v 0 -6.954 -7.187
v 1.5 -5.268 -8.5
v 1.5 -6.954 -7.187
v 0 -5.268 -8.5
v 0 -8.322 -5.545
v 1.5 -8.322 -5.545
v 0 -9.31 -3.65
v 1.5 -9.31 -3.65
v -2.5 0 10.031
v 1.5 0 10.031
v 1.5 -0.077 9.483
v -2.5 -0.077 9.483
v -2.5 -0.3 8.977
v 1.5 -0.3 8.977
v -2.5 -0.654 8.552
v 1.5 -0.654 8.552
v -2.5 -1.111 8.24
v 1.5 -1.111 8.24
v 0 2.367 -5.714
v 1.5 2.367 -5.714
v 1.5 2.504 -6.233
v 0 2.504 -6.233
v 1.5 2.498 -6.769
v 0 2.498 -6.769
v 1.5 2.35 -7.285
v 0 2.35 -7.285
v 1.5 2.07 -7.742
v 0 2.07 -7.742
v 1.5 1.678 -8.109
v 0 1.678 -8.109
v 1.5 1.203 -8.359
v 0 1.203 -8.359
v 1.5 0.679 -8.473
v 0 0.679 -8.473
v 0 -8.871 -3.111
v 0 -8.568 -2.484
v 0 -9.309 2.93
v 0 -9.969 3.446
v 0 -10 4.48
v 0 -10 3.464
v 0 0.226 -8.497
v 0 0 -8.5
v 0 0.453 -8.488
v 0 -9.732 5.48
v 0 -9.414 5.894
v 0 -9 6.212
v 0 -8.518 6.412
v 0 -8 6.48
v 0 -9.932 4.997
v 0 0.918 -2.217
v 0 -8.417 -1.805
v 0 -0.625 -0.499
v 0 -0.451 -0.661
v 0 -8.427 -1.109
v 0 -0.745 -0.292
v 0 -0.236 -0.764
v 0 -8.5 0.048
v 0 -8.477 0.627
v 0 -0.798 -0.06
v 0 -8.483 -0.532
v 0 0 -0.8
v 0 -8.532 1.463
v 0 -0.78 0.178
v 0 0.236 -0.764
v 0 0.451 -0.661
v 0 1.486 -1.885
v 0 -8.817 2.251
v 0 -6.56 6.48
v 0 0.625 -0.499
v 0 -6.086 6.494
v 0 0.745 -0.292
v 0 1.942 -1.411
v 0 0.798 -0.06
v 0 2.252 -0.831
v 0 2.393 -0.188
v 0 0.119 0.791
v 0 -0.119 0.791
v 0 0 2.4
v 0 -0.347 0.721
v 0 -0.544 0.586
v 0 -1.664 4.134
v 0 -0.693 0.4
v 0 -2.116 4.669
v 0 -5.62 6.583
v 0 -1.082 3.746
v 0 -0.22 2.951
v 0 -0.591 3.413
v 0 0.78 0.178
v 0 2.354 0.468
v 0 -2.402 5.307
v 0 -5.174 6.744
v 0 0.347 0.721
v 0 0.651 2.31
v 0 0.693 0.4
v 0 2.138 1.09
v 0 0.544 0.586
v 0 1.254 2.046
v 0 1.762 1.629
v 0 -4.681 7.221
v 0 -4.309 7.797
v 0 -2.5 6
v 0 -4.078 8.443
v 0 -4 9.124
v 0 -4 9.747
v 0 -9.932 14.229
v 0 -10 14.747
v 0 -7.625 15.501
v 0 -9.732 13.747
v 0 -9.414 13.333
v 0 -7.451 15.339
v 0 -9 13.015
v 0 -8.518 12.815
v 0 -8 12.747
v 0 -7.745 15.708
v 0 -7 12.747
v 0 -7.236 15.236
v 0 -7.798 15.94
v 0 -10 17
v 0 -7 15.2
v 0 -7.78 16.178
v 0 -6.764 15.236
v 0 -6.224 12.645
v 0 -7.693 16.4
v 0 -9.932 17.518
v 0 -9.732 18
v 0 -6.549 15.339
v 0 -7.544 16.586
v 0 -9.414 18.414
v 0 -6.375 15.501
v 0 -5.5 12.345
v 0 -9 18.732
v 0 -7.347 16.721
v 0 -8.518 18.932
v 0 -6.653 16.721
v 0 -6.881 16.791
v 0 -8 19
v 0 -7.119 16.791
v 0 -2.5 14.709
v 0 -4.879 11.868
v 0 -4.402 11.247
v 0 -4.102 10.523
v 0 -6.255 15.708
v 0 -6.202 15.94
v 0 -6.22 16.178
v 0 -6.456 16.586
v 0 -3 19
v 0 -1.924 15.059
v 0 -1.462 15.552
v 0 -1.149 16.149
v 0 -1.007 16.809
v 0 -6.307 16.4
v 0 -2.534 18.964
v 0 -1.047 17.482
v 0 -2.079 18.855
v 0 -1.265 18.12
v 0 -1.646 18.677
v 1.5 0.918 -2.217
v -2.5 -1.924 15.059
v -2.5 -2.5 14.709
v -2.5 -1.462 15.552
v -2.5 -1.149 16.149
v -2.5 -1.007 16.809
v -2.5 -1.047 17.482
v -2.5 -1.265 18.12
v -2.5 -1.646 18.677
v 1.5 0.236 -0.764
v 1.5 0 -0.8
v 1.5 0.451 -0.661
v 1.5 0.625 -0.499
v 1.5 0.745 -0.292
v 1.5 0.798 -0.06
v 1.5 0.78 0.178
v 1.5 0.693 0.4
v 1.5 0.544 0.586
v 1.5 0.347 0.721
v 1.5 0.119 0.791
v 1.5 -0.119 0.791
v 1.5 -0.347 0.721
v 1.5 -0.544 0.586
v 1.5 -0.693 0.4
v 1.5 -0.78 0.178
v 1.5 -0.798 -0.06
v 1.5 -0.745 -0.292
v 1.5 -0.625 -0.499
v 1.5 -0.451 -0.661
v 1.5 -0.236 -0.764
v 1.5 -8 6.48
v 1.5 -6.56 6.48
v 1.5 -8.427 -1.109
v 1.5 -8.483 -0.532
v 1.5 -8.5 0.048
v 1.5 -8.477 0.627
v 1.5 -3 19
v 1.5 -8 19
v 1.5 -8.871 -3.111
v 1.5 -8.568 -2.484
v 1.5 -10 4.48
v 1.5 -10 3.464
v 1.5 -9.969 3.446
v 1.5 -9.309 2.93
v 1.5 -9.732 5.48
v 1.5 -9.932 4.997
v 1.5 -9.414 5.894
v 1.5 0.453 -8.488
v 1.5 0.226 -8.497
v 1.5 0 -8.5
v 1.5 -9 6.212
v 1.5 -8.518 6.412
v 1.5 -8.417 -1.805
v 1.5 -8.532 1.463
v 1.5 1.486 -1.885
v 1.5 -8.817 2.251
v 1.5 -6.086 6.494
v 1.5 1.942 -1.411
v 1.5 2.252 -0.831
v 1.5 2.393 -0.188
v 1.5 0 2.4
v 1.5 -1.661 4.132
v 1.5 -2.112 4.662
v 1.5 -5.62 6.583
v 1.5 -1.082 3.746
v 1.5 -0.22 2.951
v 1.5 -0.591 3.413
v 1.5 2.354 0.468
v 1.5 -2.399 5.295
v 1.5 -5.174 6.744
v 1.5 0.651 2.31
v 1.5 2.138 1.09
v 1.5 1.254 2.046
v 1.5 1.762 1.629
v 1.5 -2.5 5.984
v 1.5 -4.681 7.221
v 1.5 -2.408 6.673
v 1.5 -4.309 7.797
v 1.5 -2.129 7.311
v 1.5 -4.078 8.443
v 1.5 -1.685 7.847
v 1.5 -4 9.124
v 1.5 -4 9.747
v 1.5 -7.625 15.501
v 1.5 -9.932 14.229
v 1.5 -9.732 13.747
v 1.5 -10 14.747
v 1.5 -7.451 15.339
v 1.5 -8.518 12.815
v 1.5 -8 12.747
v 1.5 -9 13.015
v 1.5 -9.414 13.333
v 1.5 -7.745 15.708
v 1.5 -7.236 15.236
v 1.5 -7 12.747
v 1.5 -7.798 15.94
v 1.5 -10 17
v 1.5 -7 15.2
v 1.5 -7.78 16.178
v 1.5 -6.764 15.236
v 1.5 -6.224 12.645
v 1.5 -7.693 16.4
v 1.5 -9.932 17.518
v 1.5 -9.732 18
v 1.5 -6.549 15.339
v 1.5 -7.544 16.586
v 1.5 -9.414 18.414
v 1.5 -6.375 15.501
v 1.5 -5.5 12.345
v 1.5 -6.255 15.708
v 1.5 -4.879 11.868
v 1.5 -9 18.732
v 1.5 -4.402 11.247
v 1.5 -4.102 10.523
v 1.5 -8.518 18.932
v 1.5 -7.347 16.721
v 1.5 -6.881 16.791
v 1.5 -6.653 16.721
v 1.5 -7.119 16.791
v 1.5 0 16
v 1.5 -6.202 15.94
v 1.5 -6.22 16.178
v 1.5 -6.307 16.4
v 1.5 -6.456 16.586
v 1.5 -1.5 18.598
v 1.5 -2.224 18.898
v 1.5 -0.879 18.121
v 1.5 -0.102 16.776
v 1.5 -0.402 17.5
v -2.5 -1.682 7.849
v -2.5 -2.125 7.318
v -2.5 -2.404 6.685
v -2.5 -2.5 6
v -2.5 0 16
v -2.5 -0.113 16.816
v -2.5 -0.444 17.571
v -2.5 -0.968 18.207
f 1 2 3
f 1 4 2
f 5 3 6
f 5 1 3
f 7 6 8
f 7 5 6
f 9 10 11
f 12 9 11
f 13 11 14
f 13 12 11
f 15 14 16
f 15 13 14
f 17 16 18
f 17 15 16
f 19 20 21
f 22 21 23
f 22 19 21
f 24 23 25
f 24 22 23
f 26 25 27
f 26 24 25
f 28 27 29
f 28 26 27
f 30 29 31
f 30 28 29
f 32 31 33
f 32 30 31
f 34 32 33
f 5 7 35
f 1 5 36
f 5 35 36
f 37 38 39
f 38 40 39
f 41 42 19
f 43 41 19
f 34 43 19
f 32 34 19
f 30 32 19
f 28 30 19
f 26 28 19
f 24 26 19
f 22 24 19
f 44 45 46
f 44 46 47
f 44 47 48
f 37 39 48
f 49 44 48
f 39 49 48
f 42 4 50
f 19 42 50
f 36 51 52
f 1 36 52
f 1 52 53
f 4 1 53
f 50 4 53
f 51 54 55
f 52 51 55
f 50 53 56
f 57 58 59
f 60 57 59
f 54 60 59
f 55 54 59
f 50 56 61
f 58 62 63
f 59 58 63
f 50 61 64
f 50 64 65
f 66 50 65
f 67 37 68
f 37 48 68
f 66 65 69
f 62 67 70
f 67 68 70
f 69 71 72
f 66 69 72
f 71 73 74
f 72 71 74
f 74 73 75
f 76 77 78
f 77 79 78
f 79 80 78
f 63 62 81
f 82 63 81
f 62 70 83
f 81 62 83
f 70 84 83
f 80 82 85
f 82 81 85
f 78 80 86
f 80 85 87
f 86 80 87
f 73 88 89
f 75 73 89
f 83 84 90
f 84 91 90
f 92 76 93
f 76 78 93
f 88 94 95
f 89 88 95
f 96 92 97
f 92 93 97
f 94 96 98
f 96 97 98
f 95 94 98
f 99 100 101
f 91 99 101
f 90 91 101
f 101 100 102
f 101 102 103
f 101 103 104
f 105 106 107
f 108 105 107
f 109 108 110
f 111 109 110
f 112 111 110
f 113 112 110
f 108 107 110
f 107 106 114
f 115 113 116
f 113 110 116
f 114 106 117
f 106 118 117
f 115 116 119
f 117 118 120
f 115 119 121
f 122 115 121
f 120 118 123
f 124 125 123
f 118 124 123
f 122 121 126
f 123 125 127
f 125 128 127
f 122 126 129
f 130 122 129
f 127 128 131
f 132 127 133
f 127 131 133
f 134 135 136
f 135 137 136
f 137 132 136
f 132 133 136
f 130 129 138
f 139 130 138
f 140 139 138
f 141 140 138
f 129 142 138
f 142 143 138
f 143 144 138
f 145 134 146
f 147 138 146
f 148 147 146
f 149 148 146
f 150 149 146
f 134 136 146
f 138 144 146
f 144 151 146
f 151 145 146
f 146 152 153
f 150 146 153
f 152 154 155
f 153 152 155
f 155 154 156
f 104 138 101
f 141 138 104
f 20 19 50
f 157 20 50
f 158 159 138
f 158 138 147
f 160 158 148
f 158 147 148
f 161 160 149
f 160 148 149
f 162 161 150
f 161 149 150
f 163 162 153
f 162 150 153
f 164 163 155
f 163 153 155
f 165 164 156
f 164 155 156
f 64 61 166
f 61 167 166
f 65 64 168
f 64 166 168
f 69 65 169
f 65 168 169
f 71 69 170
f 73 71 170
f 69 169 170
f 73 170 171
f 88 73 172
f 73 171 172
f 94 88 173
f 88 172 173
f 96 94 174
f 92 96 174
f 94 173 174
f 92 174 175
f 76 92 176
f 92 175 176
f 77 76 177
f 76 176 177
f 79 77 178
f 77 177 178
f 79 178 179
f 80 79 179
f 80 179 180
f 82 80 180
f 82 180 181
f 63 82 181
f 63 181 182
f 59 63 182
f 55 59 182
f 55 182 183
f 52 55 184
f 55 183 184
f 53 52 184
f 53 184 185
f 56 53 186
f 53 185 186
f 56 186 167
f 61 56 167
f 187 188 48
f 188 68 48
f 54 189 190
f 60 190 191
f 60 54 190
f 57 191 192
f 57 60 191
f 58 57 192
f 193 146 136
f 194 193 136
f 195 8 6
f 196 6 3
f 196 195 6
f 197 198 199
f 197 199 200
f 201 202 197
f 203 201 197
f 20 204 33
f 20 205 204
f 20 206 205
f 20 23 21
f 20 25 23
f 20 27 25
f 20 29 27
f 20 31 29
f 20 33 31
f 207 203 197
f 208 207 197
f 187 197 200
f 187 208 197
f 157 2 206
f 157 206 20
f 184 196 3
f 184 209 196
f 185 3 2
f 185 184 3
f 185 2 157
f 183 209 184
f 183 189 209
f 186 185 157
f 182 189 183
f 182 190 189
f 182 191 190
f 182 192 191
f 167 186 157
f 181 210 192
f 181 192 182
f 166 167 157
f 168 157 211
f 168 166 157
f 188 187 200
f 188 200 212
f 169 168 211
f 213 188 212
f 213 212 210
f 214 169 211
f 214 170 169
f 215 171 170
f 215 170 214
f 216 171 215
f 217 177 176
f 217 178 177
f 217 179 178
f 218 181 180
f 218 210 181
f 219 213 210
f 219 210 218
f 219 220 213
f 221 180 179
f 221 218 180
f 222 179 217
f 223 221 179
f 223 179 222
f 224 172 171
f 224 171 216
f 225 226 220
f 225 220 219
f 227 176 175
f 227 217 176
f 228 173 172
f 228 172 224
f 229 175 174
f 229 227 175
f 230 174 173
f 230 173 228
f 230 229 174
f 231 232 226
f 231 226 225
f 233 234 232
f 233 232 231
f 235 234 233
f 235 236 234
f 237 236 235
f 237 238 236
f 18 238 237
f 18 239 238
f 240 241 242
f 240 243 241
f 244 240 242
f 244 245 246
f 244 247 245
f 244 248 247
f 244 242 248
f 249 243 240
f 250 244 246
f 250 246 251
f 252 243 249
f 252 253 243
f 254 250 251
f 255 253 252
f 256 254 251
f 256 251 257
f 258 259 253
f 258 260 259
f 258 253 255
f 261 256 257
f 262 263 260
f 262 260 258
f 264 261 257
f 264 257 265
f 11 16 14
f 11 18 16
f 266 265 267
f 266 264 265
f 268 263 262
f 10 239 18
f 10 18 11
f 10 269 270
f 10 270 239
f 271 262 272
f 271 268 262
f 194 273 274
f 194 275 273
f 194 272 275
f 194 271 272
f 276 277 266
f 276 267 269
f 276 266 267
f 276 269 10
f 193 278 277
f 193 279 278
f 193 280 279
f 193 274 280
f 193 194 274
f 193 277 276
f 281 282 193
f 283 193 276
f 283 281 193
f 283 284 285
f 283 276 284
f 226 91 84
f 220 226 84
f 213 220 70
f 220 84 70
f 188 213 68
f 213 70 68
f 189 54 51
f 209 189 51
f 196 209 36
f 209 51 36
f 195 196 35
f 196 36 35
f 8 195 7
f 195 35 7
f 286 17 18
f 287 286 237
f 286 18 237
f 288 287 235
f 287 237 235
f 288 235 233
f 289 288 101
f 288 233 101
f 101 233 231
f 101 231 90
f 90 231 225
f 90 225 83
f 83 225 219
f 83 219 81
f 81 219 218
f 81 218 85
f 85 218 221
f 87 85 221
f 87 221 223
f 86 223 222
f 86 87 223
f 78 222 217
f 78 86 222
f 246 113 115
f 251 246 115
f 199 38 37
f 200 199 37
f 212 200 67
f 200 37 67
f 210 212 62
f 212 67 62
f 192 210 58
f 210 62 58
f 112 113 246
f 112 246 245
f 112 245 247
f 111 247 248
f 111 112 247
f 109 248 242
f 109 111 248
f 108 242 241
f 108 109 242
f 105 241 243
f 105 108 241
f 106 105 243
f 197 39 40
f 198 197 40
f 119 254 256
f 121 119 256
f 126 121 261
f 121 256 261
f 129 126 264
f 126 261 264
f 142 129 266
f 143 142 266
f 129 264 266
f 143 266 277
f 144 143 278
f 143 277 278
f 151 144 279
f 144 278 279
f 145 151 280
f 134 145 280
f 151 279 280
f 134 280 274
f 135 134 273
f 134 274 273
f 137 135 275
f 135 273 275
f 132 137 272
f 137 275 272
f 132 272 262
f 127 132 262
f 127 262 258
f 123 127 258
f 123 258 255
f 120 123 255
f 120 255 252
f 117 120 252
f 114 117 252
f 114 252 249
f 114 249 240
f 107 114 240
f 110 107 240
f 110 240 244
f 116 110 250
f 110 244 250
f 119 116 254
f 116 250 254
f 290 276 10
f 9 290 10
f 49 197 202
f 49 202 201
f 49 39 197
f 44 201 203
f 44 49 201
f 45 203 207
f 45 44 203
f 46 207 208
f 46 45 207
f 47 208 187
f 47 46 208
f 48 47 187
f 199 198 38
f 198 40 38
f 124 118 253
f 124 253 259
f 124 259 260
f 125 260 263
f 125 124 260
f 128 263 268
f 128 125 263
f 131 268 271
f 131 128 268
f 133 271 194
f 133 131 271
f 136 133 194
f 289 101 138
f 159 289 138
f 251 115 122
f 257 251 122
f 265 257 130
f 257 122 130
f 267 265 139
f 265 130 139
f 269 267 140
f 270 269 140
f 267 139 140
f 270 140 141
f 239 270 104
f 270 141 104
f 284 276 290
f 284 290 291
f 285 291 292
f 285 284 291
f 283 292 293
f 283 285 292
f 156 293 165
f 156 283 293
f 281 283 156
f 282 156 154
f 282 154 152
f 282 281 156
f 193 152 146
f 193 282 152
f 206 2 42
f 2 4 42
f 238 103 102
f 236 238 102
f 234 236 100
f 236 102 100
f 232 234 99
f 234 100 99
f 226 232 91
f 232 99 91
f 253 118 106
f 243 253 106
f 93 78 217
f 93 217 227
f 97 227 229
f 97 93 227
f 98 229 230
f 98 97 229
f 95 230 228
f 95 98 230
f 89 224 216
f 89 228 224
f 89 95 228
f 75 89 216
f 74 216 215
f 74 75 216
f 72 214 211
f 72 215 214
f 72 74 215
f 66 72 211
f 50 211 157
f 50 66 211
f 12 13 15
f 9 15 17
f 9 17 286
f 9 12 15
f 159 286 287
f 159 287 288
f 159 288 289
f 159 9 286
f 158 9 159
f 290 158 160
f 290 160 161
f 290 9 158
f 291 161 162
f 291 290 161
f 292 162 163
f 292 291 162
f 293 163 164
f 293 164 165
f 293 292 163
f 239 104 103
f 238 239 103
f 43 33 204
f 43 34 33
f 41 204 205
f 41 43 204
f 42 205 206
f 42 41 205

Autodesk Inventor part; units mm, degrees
ref_plane "YZ Plane" through (0, 0, 0) normal (1, 0, 0) x (0, 1, 0)
ref_plane "XZ Plane" through (0, 0, 0) normal (0, 1, 0) x (-1, 0, 0)
ref_plane "XY Plane" through (0, 0, 0) normal (0, 0, 1) x (1, 0, 0)
sketch "スケッチ1" plane through (0, 0, 0) normal (1, 0, 0) x (0, 1, 0)
  circle A0 centre (0, 0) radius 6 construction
  circle A1 centre (6, 0) radius 0.8
  line L0 (-14, 0) -> (14, 0)
  circle A2 centre (4.242641, 4.242641) radius 0.8
  circle A3 centre (0, 6) radius 0.8
  circle A4 centre (-4.242641, 4.242641) radius 0.8
  circle A5 centre (-6, 0) radius 0.8
  circle A6 centre (-4.242641, -4.242641) radius 0.8
  circle A7 centre (0, -6) radius 0.8
  circle A8 centre (4.242641, -4.242641) radius 0.8
  circle A9 centre (0, 0) radius 2.4
  line L1 (0, 0) -> (0, 6)
  line L2 (0, 0) -> (2.296101, -5.543277)
  circle A10 centre (0, 0) radius 10
  line L3 (2.296101, -5.543277) -> (3.826834, -9.238795)
  line L4 (0, -9.238795) -> (-10, -9.238795)
  line L5 (-10, -9.238795) -> (-10, 20)
  line L6 (-10, 20) -> (0, 20)
  line L7 (0, 20) -> (0, -9.238795)
  line L8 (0, -6) -> (4.242641, -4.242641) construction
  line L9 (0, -9.238795) -> (3.826834, -9.238795)
  circle A11 centre (0, 6) radius 2.5
  point P0 (0, 5.2)
  point P1 (0, 6.8)
  point P2 (-10, 0)
  point P3 (2.12132, -5.12132)
  point P4 (0, 2.4)
  point P5 (0.91844, -2.217311)
  point P6 (0, 8.5)
  point P7 (0, 10)
  point P8 (0, 3.5)
  point P9 (-3.826834, -9.238795)
  point P10 (0, -6.8)
  point P11 (0, -5.2)
  point P12 (0, -2.4)
  dimension "d1" = 12
  dimension "d2" = 1.6
  dimension "d5" = 360
  dimension "d7" = 4.8
  dimension "d8" = 4
  dimension "d21" = 5
  dimension "d23" = 20
sketch "スケッチ1 outline for 押し出し1" plane through (0, 0, 0) normal (1, 0, 0) x (0, 1, 0)
  arc A0 (0.91844, -2.217311) -> (0, 2.4) centre (0, 0) ccw
  line L0 (0, 2.4) -> (0, 3.5)
  arc A1 (0, 3.5) -> (0, 8.5) centre (0, 6) cw
  line L1 (0, 8.5) -> (0, 20)
  line L2 (0, 20) -> (-10, 20)
  line L3 (-10, 20) -> (-10, -9.238795)
  line L4 (-10, -9.238795) -> (3.826834, -9.238795)
  line L5 (3.826834, -9.238795) -> (0.91844, -2.217311)
extrude "押し出し1" add sketch "スケッチ1 outline for 押し出し1" along normal blind 1.5
sketch "スケッチ6" plane through (0, 0, 0) normal (-1, 0, 0) x (0, 0, 1)
  line L0 (12.746794, -7) -> (12.746794, -8)
  line L1 (17, -10) -> (14.746794, -10)
  line L2 (19, -8) -> (19, -3)
  arc A0 (19, -3) -> (16, 0) centre (16, -3) ccw
  line L3 (10.031129, 0) -> (16, 0)
  arc A1 (3.630208, 0.796296) -> (8.239516, -1.111111) centre (6, 0) ccw
  arc A2 (3.276042, 2.707407) -> (-3.926488, 1.626405) centre (0, 0) ccw
  line L4 (-5.713879, 2.366766) -> (-3.926488, 1.626405)
  arc A3 (-8.47286, 0.678702) -> (-8.5, 0) centre (0, 0) ccw
  line L5 (-8.5, 0) -> (-8.5, -5.267827)
  arc A4 (-8.5, -5.267827) -> (-3.6504, -9.309918) centre (0, 0) ccw
  arc A5 (-1.108696, -8.427384) -> (-3.6504, -9.309918) centre (-1.5, -11.401754) ccw
  arc A6 (-1.108696, -8.427384) -> (0.626747, -8.476862) centre (0, 0) ccw
  arc A7 (3.446028, -9.968696) -> (0.626747, -8.476862) centre (0.847952, -11.468696) ccw
  line L6 (3.446028, -9.968696) -> (3.464102, -10)
  line L7 (4.479657, -10) -> (3.464102, -10)
  line L8 (6.479657, -8) -> (6.479657, -6.559689)
  arc A8 (6.743932, -5.173913) -> (6.479657, -6.559689) centre (9.47607, -6.413035) ccw
  arc A9 (9.124144, -4) -> (6.743932, -5.173913) centre (9.124144, -7) ccw
  line L9 (9.124144, -4) -> (9.746794, -4)
  arc A10 (12.746794, -7) -> (9.746794, -4) centre (9.746794, -7) ccw
  circle A11 centre (17, -3.5) radius 0.8
  circle A12 centre (-6, 0) radius 0.8
  circle A13 centre (-4.242641, -4.242641) radius 0.8
  circle A14 centre (4.242641, -4.242641) radius 0.8
  circle A15 centre (0, -6) radius 0.8
  arc A16 (2.4, 0) -> (-2.217311, 0.91844) centre (0, 0) ccw
  line L10 (-9.238795, 3.826834) -> (-2.217311, 0.91844)
  line L11 (-9.238795, -10) -> (-9.238795, 3.826834)
  line L12 (20, -10) -> (-9.238795, -10)
  line L13 (20, 0) -> (20, -10)
  line L14 (8.5, 0) -> (20, 0)
  arc A17 (3.5, 0) -> (8.5, 0) centre (6, 0) ccw
  line L15 (2.4, 0) -> (3.5, 0)
  circle A18 centre (16, -7) radius 0.8
  circle A19 centre (0, 0) radius 0.8
  arc A20 (3.630208, 0.796296) -> (3.276042, 2.707407) centre (1.734375, 1.433333) ccw
  arc A21 (-5.713879, 2.366766) -> (-8.47286, 0.678702) centre (-6.479246, 0.519007) ccw
  arc A22 (4.479657, -10) -> (6.479657, -8) centre (4.479657, -8) ccw
  arc A23 (12.746794, -8) -> (14.746794, -10) centre (14.746794, -8) ccw
  arc A24 (17, -10) -> (19, -8) centre (17, -8) ccw
  arc A25 (10.031129, 0) -> (8.239516, -1.111111) centre (10.031129, -2) ccw
  point P0 (-7.852976, 3.252809)
  point P1 (6.479657, -10)
  point P2 (12.746794, -10)
  point P3 (16, 0)
  point P4 (19, -10)
  point P5 (-3.926488, 1.626405)
  point P6 (8.239516, -1.111111)
  point P7 (-3.926488, 1.626405)
  point P8 (16, 0)
sketch "スケッチ6 outline for 押し出し5" plane through (0, 0, 0) normal (-1, 0, 0) x (0, 0, 1)
  arc A0 (8.5, 0) -> (8.239516, -1.111111) centre (6, 0) cw
  line L0 (10.031129, 0) -> (8.5, 0)
  arc A1 (8.239516, -1.111111) -> (10.031129, 0) centre (10.031129, -2) cw
  line L1 (12.746794, -8) -> (12.746794, -7)
  arc A2 (14.746794, -10) -> (12.746794, -8) centre (14.746794, -8) cw
  line L2 (4.479657, -10) -> (14.746794, -10)
  arc A3 (6.479657, -8) -> (4.479657, -10) centre (4.479657, -8) cw
  line L3 (6.479657, -6.559689) -> (6.479657, -8)
  arc A4 (6.743932, -5.173913) -> (6.479657, -6.559689) centre (9.47607, -6.413035) ccw
  arc A5 (9.124144, -4) -> (6.743932, -5.173913) centre (9.124144, -7) ccw
  line L4 (9.746794, -4) -> (9.124144, -4)
  arc A6 (12.746794, -7) -> (9.746794, -4) centre (9.746794, -7) ccw
  line L5 (19, -3) -> (19, -8)
  arc A7 (16, 0) -> (19, -3) centre (16, -3) cw
  line L6 (20, 0) -> (16, 0)
  line L7 (20, -10) -> (20, 0)
  line L8 (17, -10) -> (20, -10)
  arc A8 (19, -8) -> (17, -10) centre (17, -8) cw
  arc A9 (-8.5, 0) -> (-8.47286, 0.678702) centre (0, 0) cw
  line L9 (-8.5, -5.267827) -> (-8.5, 0)
  arc A10 (-3.6504, -9.309918) -> (-8.5, -5.267827) centre (0, 0) cw
  arc A11 (-1.108696, -8.427384) -> (-3.6504, -9.309918) centre (-1.5, -11.401754) ccw
  arc A12 (0.626747, -8.476862) -> (-1.108696, -8.427384) centre (0, 0) cw
  arc A13 (3.446028, -9.968696) -> (0.626747, -8.476862) centre (0.847952, -11.468696) ccw
  line L10 (3.464102, -10) -> (3.446028, -9.968696)
  line L11 (-9.238795, -10) -> (3.464102, -10)
  line L12 (-9.238795, 3.826834) -> (-9.238795, -10)
  line L13 (-5.713879, 2.366766) -> (-9.238795, 3.826834)
  arc A14 (-8.47286, 0.678702) -> (-5.713879, 2.366766) centre (-6.479246, 0.519007) cw
extrude "押し出し5" cut sketch "スケッチ6 outline for 押し出し5" against normal through all
sketch "スケッチ7" plane through (0, 0, 0) normal (-1, 0, 0) x (0, 0, 1)
  line L0 (14.5, -3.5) -> (6.629791, -3.5)
  arc A0 (-7.852976, 3.252809) -> (-8.5, 0) centre (0, 0) ccw
  line L1 (-8.5, 0) -> (-8.5, -5.267827)
  arc A1 (-8.5, -5.267827) -> (-3.6504, -9.309918) centre (0, 0) ccw
  arc A2 (-1.108696, -8.427384) -> (-3.6504, -9.309918) centre (-1.5, -11.401754) ccw
  arc A3 (-1.108696, -8.427384) -> (0.626747, -8.476862) centre (0, 0) ccw
  arc A4 (3.446028, -9.968696) -> (0.626747, -8.476862) centre (0.847952, -11.468696) ccw
  line L2 (3.446028, -9.968696) -> (3.464102, -10)
  line L3 (6.479657, -10) -> (3.464102, -10)
  line L4 (6.479657, -10) -> (6.479657, -6.559689)
  arc A5 (6.743932, -5.173913) -> (6.479657, -6.559689) centre (9.47607, -6.413035) ccw
  arc A6 (9.124144, -4) -> (6.743932, -5.173913) centre (9.124144, -7) ccw
  line L5 (9.124144, -4) -> (9.746794, -4)
  arc A7 (12.746794, -7) -> (9.746794, -4) centre (9.746794, -7) ccw
  line L6 (12.746794, -7) -> (12.746794, -10)
  line L7 (19, -10) -> (12.746794, -10)
  line L8 (19, -10) -> (19, -3)
  arc A8 (19, -3) -> (16, 0) centre (16, -3) ccw
  line L9 (8.5, 0) -> (16, 0)
  arc A9 (3.5, 0) -> (8.5, 0) centre (6, 0) ccw
  line L10 (2.4, 0) -> (3.5, 0)
  arc A10 (2.4, 0) -> (-2.217311, 0.91844) centre (0, 0) ccw
  line L11 (-7.852976, 3.252809) -> (-2.217311, 0.91844)
  circle A11 centre (17, -3.5) radius 0.8
  circle A12 centre (17, -3.5) radius 2.5
  line L12 (6.629791, -3.5) -> (0, -3.5)
  circle A13 centre (0, 0) radius 3.5
  line L13 (3.5, 0) -> (3.5, -3.5)
  line L14 (0, -3.5) -> (14.708712, -3.5)
  line L15 (14.708712, -3.5) -> (14.708712, -2.5)
  line L16 (14.708712, -2.5) -> (0, -2.5)
  line L17 (0, -2.5) -> (0, -3.5)
  point P0 (18.677033, -1.645934)
  point P1 (6, -2.5)
  dimension "d31" = 5
  dimension "d34" = 1
sketch "スケッチ7 outline for 押し出し6" plane through (0, 0, 0) normal (-1, 0, 0) x (0, 0, 1)
  line L0 (16, 0) -> (8.5, 0)
  arc A0 (18.677033, -1.645934) -> (16, 0) centre (16, -3) ccw
  arc A1 (14.708712, -2.5) -> (18.677033, -1.645934) centre (17, -3.5) cw
  line L1 (6, -2.5) -> (14.708712, -2.5)
  arc A2 (8.5, 0) -> (6, -2.5) centre (6, 0) cw
extrude "押し出し6" add sketch "スケッチ7 outline for 押し出し6" along normal blind 2.5
sketch "スケッチ8" plane through (1.5, 0, 0) normal (1, 0, 0) x (0, 0, -1)
  circle A0 centre (-16, -7) radius 0.8
  line L0 (-17, -10) -> (-14.746794, -10)
  line L1 (-19, -3) -> (-19, -8)
  circle A1 centre (0, 0) radius 0.8
  point P0 (-19, -10)
  point P1 (-12.746794, -10)
  dimension "d35" = 1.6
  dimension "d36" = 3
  dimension "d37" = 3
  dimension "d40" = 1.6
sketch "スケッチ8 outline for 押し出し7" plane through (1.5, 0, 0) normal (1, 0, 0) x (0, 0, -1)
  circle A0 centre (-16, -7) radius 0.8
  circle A1 centre (0, 0) radius 0.8
extrude "押し出し7" cut sketch "スケッチ8 outline for 押し出し7" against normal through all
fillet "フィレット1" radius 2 2 edges at (0.75, 0, 3.5) (-1.25, 0, 8.5)
properties part number "toe_springjoint_cover_under_left"
